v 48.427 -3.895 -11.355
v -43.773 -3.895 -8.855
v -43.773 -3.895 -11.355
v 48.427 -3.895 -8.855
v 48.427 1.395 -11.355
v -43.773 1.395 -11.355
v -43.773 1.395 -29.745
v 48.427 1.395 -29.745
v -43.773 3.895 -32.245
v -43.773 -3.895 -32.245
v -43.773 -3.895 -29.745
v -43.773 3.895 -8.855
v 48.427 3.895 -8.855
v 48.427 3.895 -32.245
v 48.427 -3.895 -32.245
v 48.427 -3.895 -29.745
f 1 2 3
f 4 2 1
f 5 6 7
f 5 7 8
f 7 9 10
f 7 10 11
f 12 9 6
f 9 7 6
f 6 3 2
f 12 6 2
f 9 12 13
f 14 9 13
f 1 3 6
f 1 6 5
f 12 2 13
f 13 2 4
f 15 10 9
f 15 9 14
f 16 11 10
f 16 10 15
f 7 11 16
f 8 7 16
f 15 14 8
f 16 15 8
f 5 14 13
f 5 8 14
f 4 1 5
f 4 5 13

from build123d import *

# Parameters (mm, degrees)
F0_W     = 117.2
F0_H     = 23.39
F1_DEPTH = 3.895
F2_T     = -2.5
F3_DEPTH = 12.5
F4_DEPTH = 12.5


with BuildPart() as f1:
    # F0 (on Front) → F1 (new body, symmetric)
    with BuildSketch(Plane.XZ):
        with Locations((2.3269541562, -20.5496732644)):
            Rectangle(F0_W, F0_H)
    extrude(amount=F1_DEPTH, both=True)

    # F2
    f2_openings = [f1.faces().sort_by_distance(p)[0] for p in [
        (2.326954, -3.895, -20.549673),
    ]]
    offset(amount=F2_T, openings=f2_openings)

    # F3 (cut, symmetric): a face of the model
    f3_faces = [f1.faces().sort_by_distance(p)[0] for p in [
        (60.9269541562, 0, -20.5496732644),
    ]]
    extrude(f3_faces, amount=F3_DEPTH, both=True, mode=Mode.SUBTRACT)

    # F4 (cut, symmetric): a face of the model
    f4_faces = [f1.faces().sort_by_distance(p)[0] for p in [
        (-56.2730458438, 0, -20.5496732644),
    ]]
    extrude(f4_faces, amount=F4_DEPTH, both=True, mode=Mode.SUBTRACT)


solid = f1.part
